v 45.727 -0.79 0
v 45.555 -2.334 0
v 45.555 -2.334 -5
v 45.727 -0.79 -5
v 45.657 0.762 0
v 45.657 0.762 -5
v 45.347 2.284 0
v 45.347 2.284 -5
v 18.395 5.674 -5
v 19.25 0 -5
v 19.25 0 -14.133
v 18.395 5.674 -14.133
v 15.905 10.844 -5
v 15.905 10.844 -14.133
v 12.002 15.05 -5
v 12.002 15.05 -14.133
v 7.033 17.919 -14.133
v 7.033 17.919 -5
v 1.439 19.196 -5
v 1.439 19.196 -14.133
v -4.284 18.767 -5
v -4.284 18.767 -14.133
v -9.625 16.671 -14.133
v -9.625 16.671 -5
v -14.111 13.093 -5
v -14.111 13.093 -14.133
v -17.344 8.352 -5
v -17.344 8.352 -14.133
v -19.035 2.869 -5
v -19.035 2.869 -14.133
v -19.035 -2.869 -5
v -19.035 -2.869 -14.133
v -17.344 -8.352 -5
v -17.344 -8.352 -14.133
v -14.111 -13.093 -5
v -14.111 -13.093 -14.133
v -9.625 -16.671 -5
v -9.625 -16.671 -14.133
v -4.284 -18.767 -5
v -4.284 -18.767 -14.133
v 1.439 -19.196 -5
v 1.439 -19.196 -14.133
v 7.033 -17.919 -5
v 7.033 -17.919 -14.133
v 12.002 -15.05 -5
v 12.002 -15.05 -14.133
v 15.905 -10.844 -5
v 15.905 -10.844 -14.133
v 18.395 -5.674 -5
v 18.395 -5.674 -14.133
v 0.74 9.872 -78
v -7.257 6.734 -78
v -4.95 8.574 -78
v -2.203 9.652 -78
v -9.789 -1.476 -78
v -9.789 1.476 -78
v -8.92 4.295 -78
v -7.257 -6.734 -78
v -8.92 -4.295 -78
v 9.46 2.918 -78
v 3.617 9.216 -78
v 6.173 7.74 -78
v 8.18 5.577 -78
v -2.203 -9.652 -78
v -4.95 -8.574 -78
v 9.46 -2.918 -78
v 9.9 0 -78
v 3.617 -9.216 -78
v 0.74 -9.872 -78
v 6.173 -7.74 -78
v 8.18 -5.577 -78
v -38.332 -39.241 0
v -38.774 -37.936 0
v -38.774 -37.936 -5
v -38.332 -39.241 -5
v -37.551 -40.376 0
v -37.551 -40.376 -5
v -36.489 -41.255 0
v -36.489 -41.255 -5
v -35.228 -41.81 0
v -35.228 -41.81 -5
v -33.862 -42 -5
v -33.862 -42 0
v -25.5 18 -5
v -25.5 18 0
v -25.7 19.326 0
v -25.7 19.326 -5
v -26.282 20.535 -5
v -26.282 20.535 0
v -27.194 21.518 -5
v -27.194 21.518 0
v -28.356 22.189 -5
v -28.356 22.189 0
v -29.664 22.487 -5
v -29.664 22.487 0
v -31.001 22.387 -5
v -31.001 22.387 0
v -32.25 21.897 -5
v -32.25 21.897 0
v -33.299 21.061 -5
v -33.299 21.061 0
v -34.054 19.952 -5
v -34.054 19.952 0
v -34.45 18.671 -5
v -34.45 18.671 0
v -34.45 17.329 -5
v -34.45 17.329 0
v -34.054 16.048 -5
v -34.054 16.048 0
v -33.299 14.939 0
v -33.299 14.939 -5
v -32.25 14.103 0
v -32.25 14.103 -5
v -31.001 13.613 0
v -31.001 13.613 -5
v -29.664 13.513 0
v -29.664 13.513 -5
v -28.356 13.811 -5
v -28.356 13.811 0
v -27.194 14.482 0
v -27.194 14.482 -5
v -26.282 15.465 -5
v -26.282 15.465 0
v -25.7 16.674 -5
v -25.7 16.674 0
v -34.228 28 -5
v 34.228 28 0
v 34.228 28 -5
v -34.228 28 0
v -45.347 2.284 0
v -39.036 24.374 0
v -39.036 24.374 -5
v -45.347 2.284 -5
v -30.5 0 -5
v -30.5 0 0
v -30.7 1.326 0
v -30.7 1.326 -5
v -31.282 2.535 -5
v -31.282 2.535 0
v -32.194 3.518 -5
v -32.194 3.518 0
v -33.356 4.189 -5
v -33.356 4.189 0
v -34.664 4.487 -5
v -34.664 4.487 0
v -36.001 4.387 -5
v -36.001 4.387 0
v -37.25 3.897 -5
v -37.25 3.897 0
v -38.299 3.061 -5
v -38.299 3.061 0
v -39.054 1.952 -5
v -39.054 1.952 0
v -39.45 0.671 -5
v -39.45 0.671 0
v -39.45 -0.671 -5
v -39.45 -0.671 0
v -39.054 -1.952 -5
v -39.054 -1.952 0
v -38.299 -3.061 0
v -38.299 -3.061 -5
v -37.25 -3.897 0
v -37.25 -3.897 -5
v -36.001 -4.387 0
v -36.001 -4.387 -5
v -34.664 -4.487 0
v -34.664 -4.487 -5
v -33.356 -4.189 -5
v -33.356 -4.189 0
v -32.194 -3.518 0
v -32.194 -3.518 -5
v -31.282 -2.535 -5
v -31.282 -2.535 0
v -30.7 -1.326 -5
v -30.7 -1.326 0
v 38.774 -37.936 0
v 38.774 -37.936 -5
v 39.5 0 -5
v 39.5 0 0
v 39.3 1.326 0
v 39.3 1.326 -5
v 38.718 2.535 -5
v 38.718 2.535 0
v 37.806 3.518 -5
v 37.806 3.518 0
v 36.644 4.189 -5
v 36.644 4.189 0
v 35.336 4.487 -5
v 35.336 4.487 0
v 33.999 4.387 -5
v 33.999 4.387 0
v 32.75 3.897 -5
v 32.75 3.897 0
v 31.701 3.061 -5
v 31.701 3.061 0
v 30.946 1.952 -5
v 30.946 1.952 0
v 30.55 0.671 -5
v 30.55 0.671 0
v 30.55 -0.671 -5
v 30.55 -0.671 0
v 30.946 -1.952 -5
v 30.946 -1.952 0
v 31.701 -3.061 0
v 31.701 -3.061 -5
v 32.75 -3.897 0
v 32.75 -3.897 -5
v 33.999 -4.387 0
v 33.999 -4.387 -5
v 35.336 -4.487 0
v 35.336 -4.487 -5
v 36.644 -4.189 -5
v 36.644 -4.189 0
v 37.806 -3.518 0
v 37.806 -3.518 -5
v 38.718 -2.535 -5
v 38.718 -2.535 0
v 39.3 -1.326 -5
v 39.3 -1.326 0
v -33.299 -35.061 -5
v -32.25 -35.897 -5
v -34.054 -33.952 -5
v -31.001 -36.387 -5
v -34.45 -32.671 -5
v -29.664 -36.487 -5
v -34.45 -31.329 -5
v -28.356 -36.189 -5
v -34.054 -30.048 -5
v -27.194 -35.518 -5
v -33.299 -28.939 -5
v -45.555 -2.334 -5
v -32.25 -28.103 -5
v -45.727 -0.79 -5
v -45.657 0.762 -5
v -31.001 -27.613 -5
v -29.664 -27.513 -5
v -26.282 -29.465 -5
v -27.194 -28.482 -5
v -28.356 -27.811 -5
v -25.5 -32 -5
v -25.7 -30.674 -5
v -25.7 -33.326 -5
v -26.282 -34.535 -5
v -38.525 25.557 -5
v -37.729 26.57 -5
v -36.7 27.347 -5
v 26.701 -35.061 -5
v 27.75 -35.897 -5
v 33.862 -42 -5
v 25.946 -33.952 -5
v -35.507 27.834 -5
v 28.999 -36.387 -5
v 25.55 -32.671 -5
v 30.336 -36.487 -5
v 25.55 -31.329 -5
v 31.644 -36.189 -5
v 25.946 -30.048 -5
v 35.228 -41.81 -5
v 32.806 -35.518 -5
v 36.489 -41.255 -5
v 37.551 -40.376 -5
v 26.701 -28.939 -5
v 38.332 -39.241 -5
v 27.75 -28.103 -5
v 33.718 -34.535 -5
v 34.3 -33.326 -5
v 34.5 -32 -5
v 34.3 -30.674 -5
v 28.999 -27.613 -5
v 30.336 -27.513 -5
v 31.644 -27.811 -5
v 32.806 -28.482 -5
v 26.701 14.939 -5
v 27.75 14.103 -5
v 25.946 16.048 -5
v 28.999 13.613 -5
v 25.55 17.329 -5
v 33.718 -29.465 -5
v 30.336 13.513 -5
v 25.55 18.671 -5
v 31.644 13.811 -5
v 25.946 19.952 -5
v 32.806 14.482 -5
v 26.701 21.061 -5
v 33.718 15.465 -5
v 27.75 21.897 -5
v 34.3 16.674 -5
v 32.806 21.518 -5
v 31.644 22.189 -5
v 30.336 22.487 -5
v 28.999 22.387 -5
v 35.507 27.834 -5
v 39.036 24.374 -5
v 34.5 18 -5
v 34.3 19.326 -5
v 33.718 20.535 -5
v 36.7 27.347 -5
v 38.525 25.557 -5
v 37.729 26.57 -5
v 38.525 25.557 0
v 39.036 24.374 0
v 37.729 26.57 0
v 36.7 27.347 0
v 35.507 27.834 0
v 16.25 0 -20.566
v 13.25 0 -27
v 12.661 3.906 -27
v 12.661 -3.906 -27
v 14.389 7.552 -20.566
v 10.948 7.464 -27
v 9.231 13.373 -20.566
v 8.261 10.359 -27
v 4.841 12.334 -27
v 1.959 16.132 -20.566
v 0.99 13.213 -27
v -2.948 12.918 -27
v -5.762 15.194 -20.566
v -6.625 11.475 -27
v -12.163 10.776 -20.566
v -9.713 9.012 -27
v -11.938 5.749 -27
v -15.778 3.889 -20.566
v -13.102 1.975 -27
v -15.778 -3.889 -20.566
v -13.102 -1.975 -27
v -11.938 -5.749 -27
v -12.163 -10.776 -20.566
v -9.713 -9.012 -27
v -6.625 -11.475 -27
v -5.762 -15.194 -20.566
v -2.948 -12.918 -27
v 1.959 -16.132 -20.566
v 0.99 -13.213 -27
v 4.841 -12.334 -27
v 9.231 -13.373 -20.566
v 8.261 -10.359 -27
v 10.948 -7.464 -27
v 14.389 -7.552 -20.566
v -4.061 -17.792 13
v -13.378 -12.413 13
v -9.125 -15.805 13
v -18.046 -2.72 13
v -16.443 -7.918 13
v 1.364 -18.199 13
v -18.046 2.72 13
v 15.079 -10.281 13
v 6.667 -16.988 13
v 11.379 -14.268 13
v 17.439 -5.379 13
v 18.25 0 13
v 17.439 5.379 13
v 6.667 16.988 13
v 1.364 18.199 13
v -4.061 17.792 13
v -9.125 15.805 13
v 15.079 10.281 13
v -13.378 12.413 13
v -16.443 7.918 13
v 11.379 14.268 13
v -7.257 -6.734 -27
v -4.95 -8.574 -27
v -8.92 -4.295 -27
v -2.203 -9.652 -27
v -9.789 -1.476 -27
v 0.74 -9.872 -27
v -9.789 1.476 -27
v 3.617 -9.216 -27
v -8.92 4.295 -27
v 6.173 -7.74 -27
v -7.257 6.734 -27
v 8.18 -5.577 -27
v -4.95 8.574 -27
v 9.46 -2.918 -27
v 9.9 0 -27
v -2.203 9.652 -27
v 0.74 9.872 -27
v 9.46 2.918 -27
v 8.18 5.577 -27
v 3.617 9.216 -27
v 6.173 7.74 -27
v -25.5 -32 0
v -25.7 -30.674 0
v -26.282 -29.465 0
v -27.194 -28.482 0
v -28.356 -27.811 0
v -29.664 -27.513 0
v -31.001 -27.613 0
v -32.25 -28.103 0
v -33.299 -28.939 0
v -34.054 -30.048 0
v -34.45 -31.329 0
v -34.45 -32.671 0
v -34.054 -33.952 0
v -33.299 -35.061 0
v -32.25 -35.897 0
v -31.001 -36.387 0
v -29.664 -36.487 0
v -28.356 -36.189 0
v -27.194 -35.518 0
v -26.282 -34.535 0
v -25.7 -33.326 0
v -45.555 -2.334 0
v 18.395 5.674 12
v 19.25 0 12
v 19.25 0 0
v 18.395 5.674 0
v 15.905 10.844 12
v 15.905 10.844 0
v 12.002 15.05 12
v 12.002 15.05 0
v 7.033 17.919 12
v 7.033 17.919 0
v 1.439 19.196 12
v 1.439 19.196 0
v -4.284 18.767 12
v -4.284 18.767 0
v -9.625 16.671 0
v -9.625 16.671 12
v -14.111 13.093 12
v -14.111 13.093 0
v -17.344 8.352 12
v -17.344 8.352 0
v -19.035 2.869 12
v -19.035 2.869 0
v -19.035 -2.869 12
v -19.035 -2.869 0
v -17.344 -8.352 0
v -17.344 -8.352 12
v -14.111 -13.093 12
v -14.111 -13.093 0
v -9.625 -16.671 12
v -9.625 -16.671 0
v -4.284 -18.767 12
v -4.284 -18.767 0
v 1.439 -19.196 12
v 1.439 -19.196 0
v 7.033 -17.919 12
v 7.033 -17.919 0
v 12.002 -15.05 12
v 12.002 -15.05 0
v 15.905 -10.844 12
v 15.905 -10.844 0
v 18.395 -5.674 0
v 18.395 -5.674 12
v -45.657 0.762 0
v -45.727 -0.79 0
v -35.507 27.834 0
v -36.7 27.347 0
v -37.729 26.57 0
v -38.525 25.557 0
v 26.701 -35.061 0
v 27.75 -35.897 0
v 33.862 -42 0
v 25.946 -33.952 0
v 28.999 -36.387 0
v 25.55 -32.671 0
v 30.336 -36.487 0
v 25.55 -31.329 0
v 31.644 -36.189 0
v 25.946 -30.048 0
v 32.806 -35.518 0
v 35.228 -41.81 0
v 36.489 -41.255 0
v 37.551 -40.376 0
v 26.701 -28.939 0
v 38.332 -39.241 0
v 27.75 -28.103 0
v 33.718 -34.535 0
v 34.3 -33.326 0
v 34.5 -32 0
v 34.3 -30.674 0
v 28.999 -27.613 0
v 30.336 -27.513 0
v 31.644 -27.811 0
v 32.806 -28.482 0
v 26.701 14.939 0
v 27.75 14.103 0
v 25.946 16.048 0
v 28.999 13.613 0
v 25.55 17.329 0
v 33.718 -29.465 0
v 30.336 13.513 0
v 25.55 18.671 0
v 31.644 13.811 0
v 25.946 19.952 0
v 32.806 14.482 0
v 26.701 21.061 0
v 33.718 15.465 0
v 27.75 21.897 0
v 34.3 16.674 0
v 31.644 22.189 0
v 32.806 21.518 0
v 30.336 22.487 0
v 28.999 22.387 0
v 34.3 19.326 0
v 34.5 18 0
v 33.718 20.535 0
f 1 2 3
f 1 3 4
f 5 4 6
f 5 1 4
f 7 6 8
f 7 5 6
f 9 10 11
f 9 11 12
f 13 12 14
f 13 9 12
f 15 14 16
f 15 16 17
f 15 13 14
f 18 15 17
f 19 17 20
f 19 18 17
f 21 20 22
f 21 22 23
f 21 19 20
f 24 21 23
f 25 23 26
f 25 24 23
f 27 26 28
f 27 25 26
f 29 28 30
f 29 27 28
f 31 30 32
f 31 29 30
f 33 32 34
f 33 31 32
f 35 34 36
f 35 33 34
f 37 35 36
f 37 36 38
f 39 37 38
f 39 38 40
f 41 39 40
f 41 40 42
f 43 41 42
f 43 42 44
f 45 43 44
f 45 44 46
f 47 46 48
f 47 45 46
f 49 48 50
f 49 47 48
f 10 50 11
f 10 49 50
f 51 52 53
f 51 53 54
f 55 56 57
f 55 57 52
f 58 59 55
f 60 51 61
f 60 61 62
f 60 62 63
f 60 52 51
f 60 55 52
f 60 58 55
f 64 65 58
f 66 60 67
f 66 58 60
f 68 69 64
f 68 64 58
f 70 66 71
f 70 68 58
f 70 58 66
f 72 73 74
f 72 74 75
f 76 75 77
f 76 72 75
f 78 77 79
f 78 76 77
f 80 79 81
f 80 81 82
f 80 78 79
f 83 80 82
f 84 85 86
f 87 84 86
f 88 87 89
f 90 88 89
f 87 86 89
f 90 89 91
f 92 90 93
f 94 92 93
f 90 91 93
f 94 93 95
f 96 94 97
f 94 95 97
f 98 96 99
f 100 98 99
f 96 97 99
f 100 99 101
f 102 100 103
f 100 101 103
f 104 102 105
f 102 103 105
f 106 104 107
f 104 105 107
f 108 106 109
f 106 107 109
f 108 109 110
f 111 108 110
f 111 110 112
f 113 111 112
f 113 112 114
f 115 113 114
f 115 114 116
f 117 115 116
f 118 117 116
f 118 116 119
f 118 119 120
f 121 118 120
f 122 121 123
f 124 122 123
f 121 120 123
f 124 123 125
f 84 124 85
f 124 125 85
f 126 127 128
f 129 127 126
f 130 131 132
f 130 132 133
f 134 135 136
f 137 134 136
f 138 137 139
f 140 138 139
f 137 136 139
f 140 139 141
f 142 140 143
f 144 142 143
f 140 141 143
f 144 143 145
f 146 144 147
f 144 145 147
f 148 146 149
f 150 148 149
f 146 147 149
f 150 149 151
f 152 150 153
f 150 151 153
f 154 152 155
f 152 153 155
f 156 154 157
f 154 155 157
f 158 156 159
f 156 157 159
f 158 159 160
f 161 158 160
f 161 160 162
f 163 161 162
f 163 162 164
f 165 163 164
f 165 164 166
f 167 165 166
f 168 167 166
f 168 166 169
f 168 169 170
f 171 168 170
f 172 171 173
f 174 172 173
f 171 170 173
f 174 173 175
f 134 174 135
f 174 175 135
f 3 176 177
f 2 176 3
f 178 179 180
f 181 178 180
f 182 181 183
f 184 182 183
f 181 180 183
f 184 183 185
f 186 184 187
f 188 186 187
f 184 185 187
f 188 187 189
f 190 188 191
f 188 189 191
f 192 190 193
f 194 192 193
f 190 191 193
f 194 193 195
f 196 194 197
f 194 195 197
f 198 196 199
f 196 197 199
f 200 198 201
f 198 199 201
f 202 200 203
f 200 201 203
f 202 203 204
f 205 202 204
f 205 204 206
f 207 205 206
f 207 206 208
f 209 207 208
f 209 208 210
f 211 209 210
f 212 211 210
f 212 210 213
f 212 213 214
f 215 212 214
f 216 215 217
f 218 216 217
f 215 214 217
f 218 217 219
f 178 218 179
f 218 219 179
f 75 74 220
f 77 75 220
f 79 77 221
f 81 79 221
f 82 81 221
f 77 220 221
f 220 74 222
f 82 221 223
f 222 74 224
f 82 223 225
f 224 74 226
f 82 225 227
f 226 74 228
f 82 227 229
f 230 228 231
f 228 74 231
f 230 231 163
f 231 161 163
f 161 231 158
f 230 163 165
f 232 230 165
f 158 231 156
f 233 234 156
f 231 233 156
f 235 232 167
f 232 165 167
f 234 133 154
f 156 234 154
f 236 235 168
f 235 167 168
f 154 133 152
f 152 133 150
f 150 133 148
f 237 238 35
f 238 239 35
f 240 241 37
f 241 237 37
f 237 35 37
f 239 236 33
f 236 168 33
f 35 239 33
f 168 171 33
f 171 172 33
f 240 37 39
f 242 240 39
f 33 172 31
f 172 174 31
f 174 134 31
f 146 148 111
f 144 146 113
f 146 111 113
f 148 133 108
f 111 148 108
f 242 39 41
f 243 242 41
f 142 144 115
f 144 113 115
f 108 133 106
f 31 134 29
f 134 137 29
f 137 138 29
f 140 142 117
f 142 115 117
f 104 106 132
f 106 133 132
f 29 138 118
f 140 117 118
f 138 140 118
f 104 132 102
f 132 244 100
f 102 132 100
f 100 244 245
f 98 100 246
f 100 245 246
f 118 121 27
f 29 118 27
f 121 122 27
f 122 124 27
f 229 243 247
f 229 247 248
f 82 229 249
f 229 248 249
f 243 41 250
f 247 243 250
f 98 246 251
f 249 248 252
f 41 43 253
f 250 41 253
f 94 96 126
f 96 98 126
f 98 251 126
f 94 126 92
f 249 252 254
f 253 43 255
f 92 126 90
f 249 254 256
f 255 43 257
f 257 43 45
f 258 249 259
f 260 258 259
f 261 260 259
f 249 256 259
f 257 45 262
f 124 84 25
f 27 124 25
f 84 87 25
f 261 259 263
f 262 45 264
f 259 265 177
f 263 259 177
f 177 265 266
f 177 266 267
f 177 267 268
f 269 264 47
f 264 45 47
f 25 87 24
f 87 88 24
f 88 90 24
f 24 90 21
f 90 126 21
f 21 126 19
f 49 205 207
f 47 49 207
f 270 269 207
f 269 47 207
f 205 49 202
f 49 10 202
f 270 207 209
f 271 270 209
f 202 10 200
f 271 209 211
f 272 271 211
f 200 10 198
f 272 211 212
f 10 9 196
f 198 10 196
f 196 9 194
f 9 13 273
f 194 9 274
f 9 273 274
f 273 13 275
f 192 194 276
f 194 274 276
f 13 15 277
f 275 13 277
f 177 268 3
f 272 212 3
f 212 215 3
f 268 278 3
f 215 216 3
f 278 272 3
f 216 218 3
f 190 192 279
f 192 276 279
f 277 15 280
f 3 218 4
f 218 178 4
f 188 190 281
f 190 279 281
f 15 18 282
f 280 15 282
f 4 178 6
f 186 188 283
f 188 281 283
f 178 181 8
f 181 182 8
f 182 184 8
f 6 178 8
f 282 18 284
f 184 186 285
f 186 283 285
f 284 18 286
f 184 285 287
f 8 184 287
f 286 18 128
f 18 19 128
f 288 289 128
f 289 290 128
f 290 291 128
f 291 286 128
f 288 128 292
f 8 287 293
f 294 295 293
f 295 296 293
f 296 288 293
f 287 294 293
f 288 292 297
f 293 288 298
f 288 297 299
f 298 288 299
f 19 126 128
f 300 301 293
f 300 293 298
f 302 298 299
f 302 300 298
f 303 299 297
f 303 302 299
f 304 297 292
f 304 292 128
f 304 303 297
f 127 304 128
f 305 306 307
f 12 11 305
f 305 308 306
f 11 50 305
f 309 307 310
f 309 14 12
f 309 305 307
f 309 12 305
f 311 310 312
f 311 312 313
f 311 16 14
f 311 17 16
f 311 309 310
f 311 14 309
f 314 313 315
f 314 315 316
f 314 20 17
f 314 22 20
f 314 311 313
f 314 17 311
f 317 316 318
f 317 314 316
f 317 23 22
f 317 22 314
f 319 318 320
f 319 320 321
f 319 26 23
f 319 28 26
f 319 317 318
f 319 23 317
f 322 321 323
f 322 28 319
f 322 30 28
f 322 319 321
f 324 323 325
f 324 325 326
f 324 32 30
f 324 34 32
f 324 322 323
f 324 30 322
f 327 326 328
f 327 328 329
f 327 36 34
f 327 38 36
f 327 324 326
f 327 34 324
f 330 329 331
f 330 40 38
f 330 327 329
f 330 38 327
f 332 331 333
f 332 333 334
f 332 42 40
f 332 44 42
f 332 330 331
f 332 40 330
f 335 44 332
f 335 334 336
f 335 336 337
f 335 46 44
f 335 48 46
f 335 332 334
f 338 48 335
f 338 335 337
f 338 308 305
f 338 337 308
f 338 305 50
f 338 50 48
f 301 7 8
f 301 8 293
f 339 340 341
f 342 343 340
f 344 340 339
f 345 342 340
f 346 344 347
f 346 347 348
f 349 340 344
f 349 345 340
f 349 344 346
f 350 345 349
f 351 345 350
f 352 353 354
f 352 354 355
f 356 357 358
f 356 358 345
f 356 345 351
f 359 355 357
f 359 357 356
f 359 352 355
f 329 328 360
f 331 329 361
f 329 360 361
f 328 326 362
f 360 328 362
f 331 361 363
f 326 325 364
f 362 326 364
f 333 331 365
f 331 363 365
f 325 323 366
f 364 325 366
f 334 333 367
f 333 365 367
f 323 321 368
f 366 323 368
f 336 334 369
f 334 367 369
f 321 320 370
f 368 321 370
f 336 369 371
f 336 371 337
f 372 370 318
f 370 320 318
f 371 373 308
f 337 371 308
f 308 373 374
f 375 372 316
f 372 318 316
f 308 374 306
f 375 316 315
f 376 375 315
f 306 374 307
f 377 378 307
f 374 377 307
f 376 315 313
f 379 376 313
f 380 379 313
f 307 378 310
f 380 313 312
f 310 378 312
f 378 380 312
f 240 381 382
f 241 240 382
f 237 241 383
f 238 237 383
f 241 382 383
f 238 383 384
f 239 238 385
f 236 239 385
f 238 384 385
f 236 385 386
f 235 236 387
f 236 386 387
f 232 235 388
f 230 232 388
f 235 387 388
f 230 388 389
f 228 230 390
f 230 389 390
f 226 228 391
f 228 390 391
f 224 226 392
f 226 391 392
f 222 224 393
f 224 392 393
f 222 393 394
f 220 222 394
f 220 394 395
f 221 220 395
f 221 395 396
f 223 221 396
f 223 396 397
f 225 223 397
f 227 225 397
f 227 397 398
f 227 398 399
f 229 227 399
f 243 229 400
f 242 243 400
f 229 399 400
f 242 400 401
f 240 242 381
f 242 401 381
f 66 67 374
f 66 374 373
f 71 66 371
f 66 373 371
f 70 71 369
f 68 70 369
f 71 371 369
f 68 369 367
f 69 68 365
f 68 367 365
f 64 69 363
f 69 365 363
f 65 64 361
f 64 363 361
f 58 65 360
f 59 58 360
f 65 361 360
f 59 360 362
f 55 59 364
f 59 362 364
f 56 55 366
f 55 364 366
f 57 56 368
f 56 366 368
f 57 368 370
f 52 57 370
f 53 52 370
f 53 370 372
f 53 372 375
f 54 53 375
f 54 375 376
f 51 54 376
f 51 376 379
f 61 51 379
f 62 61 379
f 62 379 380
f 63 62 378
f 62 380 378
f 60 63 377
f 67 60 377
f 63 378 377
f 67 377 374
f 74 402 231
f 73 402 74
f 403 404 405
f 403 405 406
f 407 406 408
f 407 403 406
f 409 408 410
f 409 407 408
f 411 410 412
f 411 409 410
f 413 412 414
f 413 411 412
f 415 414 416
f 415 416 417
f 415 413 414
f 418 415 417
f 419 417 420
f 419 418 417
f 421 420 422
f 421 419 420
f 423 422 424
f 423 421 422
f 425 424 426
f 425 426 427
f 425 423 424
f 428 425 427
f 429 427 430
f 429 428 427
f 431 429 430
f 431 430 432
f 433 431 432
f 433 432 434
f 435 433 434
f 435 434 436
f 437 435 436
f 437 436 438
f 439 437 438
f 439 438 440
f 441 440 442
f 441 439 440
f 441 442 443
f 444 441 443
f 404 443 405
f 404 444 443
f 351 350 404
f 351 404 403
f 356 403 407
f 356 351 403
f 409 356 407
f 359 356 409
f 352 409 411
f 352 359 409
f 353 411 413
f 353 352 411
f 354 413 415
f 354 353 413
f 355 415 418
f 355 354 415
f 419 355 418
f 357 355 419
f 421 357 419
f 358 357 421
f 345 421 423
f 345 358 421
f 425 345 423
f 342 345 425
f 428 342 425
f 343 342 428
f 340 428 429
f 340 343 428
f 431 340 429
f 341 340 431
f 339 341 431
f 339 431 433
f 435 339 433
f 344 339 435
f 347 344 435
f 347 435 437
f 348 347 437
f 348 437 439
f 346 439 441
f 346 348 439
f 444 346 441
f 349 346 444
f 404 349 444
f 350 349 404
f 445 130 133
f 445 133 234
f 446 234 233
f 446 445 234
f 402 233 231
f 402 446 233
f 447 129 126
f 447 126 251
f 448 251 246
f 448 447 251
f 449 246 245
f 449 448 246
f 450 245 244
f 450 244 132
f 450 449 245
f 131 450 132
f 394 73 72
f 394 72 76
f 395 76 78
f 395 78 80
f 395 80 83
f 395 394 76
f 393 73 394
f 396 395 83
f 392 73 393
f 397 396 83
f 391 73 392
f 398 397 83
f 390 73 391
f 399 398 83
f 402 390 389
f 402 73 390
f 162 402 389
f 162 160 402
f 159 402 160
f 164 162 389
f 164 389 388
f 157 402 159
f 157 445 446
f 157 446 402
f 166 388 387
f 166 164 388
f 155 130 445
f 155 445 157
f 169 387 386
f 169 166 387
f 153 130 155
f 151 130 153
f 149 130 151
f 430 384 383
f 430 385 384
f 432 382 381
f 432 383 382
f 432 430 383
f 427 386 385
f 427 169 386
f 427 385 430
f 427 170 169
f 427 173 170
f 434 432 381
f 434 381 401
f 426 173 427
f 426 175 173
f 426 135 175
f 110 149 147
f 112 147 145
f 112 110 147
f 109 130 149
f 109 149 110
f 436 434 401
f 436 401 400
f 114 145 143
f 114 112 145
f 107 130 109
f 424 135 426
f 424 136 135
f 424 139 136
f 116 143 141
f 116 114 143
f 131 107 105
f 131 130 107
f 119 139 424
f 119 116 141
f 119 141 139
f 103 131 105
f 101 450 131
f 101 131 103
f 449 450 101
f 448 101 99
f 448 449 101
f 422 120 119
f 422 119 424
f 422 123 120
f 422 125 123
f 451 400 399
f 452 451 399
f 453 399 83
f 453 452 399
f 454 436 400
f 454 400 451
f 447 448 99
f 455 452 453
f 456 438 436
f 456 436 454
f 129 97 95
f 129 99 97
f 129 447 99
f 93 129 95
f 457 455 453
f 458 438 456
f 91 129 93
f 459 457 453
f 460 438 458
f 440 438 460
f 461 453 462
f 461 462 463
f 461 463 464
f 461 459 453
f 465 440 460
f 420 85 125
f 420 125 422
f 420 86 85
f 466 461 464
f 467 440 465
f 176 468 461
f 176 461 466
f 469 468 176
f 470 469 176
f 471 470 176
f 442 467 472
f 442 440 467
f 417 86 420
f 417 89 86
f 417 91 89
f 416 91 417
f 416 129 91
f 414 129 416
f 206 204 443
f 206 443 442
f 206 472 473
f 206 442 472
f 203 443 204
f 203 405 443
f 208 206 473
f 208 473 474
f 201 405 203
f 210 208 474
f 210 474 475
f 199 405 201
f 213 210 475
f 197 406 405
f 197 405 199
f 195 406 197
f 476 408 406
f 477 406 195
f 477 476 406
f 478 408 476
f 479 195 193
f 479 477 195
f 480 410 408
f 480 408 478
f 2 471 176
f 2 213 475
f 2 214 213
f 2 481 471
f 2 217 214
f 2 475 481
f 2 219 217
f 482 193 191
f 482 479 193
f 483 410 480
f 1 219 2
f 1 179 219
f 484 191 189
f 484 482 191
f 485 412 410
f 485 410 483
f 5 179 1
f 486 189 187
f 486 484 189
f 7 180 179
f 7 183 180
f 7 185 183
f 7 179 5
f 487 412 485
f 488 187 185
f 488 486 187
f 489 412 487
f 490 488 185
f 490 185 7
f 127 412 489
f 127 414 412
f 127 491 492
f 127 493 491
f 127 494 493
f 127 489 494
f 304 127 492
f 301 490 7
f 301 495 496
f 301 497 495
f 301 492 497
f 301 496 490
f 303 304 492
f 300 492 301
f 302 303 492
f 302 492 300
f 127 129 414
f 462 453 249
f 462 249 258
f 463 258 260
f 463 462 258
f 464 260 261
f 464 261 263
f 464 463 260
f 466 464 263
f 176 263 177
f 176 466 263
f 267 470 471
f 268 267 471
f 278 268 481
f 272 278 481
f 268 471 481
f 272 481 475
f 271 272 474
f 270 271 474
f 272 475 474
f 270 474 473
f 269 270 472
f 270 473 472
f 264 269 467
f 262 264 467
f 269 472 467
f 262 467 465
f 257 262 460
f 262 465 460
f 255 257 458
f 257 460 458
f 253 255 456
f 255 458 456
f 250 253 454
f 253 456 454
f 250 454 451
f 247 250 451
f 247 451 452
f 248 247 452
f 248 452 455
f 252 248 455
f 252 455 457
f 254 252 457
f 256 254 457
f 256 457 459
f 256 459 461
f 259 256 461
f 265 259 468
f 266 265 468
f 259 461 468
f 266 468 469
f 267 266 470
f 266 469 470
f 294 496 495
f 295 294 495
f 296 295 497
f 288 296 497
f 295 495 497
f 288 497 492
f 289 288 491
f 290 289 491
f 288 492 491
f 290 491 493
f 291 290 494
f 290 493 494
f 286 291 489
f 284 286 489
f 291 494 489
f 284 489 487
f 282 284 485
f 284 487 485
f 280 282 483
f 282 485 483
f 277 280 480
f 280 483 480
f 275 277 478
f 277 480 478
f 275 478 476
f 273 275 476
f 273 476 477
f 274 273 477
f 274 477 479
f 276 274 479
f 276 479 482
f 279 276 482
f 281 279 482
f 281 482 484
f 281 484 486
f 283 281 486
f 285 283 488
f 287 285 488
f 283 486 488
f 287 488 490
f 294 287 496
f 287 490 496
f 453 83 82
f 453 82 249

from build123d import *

# Parameters (mm, degrees)
ESQUISSE1_R             = 19.25
BOSS_EXTRU_1_DEPTH      = 13
BOSS_EXTRU_1_DEPTH_BACK = 27
ESQUISSE1_6_R           = 4.5
ESQUISSE1_6_R_2         = 19.25
BOSS_EXTRU_2_DEPTH      = 5
CHANFREIN1_SIZE         = 1
ESQUISSE6_R             = 9.9
BOSS_EXTRU_4_DEPTH      = 51
CHANFREIN2_SIZE         = 6
CHANFREIN2_SIZE2        = 12.867041523


with BuildPart() as part:
    # Esquisse1 → Boss.-Extru.1 (new body, two sides)
    with BuildSketch(Plane.XY) as boss_extru_1_sk:
        Circle(ESQUISSE1_R)
    extrude(amount=BOSS_EXTRU_1_DEPTH)
    extrude(boss_extru_1_sk.sketch, amount=-BOSS_EXTRU_1_DEPTH_BACK)

    # Esquisse1_6 → Boss.-Extru.2 (add)
    with BuildSketch(Plane.XY):
        with BuildLine():
            Line((34.228492936, 28), (0, 28))
            Line((0, 28), (-34.228492936, 28))
            ThreePointArc((-34.228492936, 28), (-37.239470502, 26.991743241), (-39.036112674, 24.373605639))
            Line((-39.036112674, 24.373605639), (-45.347302875, 2.284439938))
            ThreePointArc((-45.347302875, 2.284439938), (-45.721922521, -0.012532828), (-45.555449063, -2.33389242))
            Line((-45.555449063, -2.33389242), (-38.774178945, -37.935560539))
            ThreePointArc((-38.774178945, -37.935560539), (-37.050133937, -40.852129456), (-33.862486113, -42))
            Line((-33.862486113, -42), (33.862486113, -42))
            ThreePointArc((33.862486113, -42), (37.050133937, -40.852129456), (38.774178945, -37.935560539))
            Line((38.774178945, -37.935560539), (45.555449063, -2.33389242))
            ThreePointArc((45.555449063, -2.33389242), (45.721922521, -0.012532828), (45.347302875, 2.284439938))
            Line((45.347302875, 2.284439938), (39.036112674, 24.373605639))
            ThreePointArc((39.036112674, 24.373605639), (37.239470502, 26.991743241), (34.228492936, 28))
        make_face()
        with Locations((-30, -32)):
            Circle(ESQUISSE1_6_R, mode=Mode.SUBTRACT)
        with Locations((30, -32)):
            Circle(ESQUISSE1_6_R, mode=Mode.SUBTRACT)
        with Locations((-35, 0)):
            Circle(ESQUISSE1_6_R, mode=Mode.SUBTRACT)
        Circle(ESQUISSE1_6_R_2, mode=Mode.SUBTRACT)
        with Locations((-30, 18)):
            Circle(ESQUISSE1_6_R, mode=Mode.SUBTRACT)
        with Locations((35, 0)):
            Circle(ESQUISSE1_6_R, mode=Mode.SUBTRACT)
        with Locations((30, 18)):
            Circle(ESQUISSE1_6_R, mode=Mode.SUBTRACT)
    extrude(amount=-BOSS_EXTRU_2_DEPTH)

    # Chanfrein1
    chanfrein1_edges = [part.edges().sort_by_distance(p)[0] for p in [
        (-19.25, 0, 13),
    ]]
    chamfer(chanfrein1_edges, length=CHANFREIN1_SIZE)

    # Esquisse6 → Boss.-Extru.4 (add)
    with BuildSketch(Plane(origin=(0, 0, -27), x_dir=(-1, 0, 0), z_dir=(0, 0, -1))):
        with Locations(Location((0, 0, 0), (0, 0, 180))):  # turned: the seam where the file's is
            Circle(ESQUISSE6_R)
    extrude(amount=BOSS_EXTRU_4_DEPTH)

    # Chanfrein2
    chanfrein2_edges = [part.edges().sort_by_distance(p)[0] for p in [
        (-19.25, 0, -27),
    ]]
    chanfrein2_side = [part.faces().sort_by_distance(p)[0] for p in [
        (-18.705527778, 0, -27),
    ]]
    chamfer(chanfrein2_edges, length=CHANFREIN2_SIZE, length2=CHANFREIN2_SIZE2, reference=chanfrein2_side[0])


solid = part.part
